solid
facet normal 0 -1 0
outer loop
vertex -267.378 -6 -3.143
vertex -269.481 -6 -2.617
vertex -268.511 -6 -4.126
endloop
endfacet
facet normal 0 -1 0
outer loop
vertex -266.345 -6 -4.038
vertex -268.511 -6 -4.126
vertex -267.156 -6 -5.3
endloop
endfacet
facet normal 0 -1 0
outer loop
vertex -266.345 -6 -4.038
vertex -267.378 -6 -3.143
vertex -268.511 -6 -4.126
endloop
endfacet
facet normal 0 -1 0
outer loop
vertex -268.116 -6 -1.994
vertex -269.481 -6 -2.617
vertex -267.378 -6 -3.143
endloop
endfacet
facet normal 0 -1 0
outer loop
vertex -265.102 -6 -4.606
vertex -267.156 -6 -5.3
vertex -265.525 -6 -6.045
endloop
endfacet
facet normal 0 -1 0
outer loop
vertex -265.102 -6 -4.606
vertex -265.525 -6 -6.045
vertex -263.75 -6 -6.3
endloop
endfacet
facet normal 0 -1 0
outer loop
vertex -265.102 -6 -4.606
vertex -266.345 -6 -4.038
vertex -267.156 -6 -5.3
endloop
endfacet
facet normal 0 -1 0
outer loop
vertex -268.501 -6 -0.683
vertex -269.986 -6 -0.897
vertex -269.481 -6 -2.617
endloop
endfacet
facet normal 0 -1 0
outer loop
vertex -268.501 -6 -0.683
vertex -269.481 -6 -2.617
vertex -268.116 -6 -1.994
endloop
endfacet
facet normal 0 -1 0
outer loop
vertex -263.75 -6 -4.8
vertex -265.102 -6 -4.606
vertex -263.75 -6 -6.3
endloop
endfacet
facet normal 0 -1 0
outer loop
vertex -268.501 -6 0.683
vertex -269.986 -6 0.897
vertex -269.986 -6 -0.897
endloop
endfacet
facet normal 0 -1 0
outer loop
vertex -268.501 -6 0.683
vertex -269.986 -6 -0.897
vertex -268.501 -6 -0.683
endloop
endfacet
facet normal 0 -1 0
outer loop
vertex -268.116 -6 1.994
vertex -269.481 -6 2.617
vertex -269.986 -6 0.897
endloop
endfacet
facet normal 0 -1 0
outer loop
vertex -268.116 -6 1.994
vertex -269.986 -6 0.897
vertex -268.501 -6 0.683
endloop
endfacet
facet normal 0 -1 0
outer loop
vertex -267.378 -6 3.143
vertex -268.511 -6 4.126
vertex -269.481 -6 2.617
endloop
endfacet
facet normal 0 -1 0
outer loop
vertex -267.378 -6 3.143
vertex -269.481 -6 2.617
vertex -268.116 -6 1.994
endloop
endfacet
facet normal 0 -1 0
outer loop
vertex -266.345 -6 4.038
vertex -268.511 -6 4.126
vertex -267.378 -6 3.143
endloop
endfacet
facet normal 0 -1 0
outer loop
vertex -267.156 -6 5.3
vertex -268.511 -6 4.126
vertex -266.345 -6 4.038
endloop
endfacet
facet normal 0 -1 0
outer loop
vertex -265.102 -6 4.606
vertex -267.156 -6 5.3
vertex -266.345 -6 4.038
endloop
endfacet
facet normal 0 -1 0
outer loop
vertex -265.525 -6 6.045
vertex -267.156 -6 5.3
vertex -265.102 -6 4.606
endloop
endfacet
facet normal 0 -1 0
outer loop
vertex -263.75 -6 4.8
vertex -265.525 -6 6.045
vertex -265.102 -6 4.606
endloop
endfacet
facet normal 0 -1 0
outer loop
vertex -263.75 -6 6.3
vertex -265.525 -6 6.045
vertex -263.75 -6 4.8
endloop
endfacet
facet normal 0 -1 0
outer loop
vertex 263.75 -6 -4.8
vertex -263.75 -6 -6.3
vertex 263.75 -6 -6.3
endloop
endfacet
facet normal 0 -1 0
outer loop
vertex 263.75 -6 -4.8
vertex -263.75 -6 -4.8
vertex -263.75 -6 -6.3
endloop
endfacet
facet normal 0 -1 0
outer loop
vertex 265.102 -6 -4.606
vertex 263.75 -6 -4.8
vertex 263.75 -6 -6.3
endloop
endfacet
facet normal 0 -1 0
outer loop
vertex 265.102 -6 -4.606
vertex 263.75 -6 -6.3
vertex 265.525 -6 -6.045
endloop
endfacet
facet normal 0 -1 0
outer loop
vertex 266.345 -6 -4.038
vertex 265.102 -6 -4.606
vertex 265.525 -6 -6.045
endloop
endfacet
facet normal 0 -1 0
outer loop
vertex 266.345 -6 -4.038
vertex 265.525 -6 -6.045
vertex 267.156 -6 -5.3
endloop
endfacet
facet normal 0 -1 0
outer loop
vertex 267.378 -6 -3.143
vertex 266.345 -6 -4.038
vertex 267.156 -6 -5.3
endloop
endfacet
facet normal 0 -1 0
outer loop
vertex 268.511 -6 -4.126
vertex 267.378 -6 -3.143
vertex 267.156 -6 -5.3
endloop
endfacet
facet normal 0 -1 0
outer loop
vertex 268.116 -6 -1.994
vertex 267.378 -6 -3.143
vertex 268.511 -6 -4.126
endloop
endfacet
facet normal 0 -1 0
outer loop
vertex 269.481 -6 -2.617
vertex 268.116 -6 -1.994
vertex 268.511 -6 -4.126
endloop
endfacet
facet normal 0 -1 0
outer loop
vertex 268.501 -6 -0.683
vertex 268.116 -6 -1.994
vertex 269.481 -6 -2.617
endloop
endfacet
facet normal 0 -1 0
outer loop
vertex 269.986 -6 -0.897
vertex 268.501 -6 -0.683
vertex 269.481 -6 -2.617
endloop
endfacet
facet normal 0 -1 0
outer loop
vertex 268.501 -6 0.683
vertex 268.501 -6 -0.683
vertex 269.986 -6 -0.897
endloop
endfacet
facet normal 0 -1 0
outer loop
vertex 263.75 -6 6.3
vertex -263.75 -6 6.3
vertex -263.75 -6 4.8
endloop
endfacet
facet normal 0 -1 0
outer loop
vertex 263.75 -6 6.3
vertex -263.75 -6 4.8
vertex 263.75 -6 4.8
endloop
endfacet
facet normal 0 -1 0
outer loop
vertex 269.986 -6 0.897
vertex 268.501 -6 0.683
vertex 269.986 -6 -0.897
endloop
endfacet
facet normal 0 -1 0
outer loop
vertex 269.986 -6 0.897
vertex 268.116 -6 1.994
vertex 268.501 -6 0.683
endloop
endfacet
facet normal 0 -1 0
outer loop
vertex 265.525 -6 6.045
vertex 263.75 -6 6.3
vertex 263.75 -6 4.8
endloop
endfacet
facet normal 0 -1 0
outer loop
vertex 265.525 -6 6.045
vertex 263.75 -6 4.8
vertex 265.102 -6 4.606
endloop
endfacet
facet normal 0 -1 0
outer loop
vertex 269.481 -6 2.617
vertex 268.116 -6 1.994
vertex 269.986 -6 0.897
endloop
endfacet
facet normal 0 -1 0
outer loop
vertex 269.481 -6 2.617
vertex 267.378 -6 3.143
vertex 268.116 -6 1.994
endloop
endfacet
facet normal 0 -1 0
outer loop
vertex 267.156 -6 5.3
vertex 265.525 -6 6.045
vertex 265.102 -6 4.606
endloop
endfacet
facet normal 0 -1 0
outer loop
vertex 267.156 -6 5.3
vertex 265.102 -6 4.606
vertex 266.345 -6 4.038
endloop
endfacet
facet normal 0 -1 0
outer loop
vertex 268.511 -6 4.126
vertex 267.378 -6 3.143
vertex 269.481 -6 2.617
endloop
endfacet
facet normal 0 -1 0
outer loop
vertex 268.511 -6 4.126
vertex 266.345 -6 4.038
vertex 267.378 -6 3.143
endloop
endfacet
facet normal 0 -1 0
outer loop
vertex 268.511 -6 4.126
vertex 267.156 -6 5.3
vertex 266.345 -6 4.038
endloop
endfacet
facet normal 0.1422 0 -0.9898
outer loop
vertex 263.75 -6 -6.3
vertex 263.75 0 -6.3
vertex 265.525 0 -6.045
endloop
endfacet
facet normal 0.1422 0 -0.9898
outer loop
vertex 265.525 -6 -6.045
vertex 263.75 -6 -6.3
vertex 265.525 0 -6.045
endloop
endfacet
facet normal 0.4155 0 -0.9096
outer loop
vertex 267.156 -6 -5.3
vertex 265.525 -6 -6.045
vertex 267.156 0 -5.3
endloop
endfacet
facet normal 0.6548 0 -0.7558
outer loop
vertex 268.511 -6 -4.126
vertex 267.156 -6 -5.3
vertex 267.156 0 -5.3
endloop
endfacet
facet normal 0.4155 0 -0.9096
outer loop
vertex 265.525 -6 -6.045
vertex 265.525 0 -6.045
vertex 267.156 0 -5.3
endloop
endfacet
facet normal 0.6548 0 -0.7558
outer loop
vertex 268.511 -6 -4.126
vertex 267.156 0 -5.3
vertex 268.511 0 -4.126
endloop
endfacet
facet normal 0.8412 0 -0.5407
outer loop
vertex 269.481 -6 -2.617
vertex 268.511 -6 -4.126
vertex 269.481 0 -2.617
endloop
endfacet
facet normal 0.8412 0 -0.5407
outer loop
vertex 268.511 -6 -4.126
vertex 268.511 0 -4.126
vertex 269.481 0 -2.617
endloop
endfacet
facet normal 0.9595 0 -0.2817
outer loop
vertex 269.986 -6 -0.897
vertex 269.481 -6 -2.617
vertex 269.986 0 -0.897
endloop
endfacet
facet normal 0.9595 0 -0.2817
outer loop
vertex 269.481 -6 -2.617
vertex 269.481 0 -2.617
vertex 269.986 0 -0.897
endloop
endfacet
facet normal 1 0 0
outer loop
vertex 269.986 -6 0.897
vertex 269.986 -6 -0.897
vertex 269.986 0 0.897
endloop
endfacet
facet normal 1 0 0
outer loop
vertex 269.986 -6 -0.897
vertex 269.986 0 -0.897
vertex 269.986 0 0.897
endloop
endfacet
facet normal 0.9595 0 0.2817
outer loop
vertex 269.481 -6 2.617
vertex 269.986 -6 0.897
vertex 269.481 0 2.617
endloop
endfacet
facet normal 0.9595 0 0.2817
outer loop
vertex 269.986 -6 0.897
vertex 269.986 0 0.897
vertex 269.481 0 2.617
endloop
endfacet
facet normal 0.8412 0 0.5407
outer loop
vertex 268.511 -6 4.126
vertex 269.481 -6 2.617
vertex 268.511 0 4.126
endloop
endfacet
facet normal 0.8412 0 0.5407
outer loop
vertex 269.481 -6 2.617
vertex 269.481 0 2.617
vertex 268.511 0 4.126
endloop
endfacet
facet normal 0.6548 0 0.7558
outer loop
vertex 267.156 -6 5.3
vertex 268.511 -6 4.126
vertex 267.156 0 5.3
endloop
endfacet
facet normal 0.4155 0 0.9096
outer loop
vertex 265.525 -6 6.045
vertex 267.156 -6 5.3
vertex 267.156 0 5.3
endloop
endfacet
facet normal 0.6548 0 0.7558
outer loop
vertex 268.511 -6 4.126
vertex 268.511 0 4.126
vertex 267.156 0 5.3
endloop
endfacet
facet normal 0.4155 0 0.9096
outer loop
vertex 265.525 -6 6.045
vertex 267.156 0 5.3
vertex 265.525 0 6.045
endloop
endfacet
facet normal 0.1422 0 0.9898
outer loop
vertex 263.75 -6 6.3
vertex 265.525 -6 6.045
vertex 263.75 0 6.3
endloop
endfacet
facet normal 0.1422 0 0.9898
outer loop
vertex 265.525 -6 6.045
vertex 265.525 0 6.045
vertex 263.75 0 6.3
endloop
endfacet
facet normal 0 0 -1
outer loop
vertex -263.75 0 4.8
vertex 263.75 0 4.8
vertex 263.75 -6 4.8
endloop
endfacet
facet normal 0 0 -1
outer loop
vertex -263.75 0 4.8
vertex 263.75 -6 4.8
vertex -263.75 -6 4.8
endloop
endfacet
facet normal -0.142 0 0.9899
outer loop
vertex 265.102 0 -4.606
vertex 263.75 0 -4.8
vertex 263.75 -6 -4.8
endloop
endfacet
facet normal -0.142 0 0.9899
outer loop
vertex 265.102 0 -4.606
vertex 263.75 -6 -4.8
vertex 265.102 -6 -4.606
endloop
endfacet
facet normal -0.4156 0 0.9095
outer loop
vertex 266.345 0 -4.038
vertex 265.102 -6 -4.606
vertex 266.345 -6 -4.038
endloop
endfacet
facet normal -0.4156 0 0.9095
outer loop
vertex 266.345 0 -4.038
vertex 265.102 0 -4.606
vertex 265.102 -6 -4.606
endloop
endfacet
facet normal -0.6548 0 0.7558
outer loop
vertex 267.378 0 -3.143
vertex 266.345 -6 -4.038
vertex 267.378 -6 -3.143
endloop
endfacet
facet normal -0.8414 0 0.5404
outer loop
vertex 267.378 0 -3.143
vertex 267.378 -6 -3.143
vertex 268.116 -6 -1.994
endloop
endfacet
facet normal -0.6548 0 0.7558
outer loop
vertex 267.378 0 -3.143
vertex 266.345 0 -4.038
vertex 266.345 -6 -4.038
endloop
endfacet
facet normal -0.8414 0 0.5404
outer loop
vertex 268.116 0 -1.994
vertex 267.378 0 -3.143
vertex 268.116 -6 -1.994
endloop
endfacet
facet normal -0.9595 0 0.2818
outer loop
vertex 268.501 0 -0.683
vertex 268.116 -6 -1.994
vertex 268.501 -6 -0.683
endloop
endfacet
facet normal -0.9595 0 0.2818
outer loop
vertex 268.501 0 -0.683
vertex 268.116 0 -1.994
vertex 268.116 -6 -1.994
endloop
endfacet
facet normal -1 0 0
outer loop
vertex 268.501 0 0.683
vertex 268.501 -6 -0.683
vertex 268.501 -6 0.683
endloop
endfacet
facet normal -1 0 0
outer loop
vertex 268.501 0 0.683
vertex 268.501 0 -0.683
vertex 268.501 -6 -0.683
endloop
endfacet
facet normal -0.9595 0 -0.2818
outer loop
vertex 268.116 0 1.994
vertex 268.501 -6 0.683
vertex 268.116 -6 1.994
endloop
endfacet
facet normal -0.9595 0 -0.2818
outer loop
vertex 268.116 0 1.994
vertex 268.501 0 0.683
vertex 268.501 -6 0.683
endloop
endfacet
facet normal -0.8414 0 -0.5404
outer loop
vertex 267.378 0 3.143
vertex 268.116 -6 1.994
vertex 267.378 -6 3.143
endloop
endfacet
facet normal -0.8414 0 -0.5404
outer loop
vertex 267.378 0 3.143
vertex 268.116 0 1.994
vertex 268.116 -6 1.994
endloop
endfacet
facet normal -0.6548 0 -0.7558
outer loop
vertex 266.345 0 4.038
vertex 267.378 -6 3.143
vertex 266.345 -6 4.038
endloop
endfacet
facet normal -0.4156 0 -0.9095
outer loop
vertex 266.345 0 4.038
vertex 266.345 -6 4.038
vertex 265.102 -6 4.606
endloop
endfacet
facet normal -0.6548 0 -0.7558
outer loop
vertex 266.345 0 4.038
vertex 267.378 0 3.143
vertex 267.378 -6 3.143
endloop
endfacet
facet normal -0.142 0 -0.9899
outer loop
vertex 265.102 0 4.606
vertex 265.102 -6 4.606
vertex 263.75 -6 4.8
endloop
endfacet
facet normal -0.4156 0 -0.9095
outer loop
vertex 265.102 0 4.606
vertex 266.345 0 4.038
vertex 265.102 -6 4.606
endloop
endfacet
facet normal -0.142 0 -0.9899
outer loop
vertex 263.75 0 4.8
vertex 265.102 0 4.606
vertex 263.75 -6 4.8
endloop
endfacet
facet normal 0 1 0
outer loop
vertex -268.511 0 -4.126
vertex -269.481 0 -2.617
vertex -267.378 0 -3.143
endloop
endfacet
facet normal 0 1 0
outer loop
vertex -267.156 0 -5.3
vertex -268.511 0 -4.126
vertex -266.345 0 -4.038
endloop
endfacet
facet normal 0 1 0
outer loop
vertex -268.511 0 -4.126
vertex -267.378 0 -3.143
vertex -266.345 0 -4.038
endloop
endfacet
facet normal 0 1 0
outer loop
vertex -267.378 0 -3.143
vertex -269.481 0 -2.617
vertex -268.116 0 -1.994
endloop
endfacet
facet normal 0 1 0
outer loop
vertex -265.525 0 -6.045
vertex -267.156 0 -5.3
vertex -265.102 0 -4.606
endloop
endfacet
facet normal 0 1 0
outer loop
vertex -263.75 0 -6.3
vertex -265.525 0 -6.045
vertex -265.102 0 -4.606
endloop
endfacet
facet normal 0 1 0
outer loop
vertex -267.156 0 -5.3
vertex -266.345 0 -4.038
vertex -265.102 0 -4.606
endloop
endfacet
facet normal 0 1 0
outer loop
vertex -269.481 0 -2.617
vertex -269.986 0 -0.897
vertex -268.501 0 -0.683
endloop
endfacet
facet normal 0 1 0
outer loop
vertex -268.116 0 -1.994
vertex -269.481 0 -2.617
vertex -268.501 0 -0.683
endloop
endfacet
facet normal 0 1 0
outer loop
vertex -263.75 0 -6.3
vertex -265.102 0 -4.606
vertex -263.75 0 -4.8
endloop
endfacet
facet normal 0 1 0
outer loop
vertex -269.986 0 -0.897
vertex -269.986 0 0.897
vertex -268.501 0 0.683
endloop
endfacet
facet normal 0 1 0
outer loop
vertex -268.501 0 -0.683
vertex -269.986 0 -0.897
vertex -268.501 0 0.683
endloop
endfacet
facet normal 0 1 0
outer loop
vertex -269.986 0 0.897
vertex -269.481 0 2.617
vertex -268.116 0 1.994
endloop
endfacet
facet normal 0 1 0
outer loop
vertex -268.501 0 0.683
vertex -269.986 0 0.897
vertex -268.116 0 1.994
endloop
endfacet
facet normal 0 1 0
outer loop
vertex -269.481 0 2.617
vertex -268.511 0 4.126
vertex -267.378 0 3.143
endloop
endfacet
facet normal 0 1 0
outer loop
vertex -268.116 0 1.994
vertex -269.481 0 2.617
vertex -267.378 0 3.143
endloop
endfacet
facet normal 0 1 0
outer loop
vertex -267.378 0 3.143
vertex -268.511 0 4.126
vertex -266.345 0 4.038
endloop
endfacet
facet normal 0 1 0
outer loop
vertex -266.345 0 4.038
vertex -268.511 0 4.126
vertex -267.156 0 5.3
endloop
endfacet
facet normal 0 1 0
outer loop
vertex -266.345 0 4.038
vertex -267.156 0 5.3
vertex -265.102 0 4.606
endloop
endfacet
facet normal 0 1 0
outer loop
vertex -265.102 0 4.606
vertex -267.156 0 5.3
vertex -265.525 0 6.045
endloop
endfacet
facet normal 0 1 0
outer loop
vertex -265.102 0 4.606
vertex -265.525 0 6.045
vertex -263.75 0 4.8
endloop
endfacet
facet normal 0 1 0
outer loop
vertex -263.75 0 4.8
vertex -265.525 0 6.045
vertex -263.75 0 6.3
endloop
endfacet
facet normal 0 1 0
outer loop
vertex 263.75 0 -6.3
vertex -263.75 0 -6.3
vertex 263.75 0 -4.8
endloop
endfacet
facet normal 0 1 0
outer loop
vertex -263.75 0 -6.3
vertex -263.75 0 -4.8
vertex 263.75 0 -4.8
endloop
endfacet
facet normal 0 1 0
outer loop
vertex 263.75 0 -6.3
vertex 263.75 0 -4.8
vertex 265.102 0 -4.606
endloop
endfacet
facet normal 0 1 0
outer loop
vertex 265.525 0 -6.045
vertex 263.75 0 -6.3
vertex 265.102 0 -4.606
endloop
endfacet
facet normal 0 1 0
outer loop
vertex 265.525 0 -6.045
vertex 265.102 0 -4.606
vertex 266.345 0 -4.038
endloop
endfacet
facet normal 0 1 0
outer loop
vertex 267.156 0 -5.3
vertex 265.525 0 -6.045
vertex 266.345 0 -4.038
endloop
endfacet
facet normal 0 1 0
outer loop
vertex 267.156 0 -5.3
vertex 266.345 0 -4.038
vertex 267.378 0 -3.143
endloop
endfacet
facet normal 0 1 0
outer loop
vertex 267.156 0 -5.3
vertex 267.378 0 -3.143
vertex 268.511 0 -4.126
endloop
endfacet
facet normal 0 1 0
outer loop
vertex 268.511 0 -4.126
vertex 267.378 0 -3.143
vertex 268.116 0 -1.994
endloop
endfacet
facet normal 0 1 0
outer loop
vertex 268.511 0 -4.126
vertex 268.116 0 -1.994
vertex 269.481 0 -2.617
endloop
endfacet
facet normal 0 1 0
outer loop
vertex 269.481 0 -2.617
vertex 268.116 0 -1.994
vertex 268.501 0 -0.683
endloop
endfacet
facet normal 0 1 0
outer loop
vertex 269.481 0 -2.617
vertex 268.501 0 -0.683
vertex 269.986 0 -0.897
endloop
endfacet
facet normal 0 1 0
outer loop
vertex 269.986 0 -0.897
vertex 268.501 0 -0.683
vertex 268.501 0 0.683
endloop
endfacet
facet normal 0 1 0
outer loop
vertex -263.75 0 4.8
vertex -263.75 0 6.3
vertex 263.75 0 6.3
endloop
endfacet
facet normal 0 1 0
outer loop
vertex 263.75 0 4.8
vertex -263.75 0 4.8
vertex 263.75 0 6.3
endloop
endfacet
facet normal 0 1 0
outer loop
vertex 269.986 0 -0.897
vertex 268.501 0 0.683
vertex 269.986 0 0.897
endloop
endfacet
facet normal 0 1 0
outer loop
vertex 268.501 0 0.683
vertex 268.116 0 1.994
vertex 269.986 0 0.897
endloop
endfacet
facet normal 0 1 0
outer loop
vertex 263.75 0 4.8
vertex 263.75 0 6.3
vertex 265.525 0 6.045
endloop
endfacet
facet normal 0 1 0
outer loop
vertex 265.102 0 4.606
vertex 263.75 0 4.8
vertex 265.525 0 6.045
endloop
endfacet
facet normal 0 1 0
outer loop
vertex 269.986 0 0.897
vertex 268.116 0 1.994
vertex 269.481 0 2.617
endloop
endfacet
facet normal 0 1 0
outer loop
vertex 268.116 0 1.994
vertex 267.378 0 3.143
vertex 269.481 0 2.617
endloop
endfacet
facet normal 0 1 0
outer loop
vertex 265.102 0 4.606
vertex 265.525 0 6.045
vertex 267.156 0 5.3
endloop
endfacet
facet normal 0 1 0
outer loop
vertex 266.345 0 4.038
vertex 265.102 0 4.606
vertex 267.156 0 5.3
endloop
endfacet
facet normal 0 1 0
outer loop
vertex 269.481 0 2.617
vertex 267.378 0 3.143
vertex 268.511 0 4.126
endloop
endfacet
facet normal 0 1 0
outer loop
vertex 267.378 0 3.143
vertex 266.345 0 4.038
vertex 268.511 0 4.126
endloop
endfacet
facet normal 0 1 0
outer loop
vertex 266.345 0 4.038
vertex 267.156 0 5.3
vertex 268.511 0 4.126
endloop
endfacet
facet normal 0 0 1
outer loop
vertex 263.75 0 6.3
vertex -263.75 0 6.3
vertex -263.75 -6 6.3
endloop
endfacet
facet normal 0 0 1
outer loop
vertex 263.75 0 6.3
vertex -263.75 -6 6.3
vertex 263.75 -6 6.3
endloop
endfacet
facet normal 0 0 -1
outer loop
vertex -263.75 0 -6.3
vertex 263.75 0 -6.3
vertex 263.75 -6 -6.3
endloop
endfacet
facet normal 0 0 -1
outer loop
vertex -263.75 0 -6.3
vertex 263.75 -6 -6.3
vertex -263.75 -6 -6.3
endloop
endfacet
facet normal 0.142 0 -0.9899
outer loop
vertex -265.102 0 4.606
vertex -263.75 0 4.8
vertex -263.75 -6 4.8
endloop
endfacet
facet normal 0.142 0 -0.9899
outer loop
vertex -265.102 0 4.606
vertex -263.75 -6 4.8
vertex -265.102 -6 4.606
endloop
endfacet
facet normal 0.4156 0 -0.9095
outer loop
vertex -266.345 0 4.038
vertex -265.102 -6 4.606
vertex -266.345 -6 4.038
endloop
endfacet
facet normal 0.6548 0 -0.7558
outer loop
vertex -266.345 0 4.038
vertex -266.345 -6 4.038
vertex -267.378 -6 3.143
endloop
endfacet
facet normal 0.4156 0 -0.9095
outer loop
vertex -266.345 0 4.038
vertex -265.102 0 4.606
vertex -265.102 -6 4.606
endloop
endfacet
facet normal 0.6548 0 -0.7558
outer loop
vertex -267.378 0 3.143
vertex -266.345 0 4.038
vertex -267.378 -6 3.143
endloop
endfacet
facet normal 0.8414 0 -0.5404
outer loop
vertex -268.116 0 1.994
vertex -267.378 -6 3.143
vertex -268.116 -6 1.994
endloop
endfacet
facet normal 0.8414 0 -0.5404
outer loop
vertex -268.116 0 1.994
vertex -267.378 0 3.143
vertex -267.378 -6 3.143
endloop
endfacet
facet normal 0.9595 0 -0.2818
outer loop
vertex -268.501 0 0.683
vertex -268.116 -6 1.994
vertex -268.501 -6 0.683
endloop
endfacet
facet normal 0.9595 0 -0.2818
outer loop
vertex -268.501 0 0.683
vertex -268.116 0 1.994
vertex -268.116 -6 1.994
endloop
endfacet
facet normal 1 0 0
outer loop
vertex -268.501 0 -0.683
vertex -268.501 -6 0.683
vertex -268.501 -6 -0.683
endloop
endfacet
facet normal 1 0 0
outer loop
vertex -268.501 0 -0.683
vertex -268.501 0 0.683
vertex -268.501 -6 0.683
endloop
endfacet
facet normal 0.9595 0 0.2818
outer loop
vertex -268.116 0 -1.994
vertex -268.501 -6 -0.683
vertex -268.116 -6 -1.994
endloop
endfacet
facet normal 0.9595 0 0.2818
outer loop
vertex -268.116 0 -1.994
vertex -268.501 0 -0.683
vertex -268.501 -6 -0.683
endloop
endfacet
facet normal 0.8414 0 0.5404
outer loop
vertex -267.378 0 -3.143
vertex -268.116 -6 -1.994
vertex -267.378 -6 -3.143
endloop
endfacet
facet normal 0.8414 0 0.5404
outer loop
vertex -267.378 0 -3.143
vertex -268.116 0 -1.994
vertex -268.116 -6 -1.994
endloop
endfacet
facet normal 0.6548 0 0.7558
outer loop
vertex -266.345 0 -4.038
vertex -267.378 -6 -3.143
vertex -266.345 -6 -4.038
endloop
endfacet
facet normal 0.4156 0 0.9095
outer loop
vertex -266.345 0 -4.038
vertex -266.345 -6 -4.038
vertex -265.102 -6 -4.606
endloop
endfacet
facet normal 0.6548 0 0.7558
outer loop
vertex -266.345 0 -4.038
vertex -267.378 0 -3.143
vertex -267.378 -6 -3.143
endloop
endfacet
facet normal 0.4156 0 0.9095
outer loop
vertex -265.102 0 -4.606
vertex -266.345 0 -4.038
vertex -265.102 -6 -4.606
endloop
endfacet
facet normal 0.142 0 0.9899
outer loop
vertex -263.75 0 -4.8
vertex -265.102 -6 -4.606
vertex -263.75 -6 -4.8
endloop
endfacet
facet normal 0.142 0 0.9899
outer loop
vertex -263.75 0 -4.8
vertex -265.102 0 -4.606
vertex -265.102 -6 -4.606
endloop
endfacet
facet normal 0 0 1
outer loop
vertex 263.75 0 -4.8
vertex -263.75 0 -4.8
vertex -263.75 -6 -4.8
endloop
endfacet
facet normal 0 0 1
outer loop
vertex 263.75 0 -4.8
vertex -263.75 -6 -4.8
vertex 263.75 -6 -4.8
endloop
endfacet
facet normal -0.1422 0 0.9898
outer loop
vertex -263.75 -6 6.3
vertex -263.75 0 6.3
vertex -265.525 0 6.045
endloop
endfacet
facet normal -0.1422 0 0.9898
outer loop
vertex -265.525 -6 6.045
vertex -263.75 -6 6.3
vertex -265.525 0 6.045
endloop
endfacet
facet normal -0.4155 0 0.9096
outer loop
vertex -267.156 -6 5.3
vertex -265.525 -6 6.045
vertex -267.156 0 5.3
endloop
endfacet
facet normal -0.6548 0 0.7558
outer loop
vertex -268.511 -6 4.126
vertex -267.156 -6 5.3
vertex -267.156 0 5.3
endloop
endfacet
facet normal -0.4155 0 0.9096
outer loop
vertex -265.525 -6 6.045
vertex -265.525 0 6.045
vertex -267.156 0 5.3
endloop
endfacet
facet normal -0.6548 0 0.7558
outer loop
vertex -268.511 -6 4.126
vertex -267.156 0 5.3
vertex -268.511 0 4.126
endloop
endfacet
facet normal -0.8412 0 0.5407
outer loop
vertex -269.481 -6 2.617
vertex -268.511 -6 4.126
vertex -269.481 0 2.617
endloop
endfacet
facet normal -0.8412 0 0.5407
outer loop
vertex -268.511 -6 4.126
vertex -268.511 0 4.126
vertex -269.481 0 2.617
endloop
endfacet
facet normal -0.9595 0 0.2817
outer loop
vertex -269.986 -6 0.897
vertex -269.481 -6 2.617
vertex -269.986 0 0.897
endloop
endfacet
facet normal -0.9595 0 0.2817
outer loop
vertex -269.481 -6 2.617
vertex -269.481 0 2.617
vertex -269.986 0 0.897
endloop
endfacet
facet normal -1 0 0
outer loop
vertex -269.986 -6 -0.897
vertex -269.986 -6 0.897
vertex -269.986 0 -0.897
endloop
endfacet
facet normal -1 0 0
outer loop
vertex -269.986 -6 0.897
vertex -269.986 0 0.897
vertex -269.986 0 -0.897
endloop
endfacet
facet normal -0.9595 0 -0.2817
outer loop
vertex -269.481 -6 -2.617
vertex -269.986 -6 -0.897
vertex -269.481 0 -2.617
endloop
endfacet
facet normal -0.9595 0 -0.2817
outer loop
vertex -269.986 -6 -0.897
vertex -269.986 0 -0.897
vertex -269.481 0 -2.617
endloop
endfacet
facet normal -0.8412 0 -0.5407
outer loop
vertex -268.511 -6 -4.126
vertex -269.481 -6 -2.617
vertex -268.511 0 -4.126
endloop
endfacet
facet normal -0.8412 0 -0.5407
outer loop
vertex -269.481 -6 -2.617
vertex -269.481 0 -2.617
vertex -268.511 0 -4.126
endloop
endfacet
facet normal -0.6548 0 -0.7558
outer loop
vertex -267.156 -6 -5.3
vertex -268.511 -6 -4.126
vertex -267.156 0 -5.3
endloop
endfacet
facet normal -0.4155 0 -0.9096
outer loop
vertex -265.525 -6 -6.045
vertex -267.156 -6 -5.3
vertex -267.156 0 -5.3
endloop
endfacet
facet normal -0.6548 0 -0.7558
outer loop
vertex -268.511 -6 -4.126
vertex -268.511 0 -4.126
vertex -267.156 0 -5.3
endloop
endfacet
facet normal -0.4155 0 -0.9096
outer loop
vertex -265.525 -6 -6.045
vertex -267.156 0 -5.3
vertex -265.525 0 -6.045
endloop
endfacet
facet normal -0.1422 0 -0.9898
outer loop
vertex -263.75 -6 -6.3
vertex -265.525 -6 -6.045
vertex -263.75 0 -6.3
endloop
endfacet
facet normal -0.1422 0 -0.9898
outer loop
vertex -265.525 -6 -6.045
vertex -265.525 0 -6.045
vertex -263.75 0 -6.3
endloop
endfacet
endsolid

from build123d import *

# Parameters (mm, degrees)
PAD_DEPTH = 6


with BuildPart() as part:
    # Sketch → Pad (new body)
    with BuildSketch(Plane.XZ):
        with BuildLine():
            ThreePointArc((-263.75, 6.3), (-270.05, 0), (-263.75, -6.3))
            Line((263.75, -6.3), (-263.75, -6.3))
            ThreePointArc((263.75, -6.3), (270.05, 0), (263.75, 6.3))
            Line((-263.75, 6.3), (263.75, 6.3))
        make_face()
        with BuildLine():
            ThreePointArc((-263.75, 4.8), (-268.55, 0), (-263.75, -4.8))
            Line((-263.75, -4.8), (263.749984, -4.8))
            ThreePointArc((263.749984, -4.8), (268.55, -8e-06), (263.75, 4.8))
            Line((263.75, 4.8), (-263.75, 4.8))
        make_face(mode=Mode.SUBTRACT)
    extrude(amount=PAD_DEPTH)


solid = part.part
